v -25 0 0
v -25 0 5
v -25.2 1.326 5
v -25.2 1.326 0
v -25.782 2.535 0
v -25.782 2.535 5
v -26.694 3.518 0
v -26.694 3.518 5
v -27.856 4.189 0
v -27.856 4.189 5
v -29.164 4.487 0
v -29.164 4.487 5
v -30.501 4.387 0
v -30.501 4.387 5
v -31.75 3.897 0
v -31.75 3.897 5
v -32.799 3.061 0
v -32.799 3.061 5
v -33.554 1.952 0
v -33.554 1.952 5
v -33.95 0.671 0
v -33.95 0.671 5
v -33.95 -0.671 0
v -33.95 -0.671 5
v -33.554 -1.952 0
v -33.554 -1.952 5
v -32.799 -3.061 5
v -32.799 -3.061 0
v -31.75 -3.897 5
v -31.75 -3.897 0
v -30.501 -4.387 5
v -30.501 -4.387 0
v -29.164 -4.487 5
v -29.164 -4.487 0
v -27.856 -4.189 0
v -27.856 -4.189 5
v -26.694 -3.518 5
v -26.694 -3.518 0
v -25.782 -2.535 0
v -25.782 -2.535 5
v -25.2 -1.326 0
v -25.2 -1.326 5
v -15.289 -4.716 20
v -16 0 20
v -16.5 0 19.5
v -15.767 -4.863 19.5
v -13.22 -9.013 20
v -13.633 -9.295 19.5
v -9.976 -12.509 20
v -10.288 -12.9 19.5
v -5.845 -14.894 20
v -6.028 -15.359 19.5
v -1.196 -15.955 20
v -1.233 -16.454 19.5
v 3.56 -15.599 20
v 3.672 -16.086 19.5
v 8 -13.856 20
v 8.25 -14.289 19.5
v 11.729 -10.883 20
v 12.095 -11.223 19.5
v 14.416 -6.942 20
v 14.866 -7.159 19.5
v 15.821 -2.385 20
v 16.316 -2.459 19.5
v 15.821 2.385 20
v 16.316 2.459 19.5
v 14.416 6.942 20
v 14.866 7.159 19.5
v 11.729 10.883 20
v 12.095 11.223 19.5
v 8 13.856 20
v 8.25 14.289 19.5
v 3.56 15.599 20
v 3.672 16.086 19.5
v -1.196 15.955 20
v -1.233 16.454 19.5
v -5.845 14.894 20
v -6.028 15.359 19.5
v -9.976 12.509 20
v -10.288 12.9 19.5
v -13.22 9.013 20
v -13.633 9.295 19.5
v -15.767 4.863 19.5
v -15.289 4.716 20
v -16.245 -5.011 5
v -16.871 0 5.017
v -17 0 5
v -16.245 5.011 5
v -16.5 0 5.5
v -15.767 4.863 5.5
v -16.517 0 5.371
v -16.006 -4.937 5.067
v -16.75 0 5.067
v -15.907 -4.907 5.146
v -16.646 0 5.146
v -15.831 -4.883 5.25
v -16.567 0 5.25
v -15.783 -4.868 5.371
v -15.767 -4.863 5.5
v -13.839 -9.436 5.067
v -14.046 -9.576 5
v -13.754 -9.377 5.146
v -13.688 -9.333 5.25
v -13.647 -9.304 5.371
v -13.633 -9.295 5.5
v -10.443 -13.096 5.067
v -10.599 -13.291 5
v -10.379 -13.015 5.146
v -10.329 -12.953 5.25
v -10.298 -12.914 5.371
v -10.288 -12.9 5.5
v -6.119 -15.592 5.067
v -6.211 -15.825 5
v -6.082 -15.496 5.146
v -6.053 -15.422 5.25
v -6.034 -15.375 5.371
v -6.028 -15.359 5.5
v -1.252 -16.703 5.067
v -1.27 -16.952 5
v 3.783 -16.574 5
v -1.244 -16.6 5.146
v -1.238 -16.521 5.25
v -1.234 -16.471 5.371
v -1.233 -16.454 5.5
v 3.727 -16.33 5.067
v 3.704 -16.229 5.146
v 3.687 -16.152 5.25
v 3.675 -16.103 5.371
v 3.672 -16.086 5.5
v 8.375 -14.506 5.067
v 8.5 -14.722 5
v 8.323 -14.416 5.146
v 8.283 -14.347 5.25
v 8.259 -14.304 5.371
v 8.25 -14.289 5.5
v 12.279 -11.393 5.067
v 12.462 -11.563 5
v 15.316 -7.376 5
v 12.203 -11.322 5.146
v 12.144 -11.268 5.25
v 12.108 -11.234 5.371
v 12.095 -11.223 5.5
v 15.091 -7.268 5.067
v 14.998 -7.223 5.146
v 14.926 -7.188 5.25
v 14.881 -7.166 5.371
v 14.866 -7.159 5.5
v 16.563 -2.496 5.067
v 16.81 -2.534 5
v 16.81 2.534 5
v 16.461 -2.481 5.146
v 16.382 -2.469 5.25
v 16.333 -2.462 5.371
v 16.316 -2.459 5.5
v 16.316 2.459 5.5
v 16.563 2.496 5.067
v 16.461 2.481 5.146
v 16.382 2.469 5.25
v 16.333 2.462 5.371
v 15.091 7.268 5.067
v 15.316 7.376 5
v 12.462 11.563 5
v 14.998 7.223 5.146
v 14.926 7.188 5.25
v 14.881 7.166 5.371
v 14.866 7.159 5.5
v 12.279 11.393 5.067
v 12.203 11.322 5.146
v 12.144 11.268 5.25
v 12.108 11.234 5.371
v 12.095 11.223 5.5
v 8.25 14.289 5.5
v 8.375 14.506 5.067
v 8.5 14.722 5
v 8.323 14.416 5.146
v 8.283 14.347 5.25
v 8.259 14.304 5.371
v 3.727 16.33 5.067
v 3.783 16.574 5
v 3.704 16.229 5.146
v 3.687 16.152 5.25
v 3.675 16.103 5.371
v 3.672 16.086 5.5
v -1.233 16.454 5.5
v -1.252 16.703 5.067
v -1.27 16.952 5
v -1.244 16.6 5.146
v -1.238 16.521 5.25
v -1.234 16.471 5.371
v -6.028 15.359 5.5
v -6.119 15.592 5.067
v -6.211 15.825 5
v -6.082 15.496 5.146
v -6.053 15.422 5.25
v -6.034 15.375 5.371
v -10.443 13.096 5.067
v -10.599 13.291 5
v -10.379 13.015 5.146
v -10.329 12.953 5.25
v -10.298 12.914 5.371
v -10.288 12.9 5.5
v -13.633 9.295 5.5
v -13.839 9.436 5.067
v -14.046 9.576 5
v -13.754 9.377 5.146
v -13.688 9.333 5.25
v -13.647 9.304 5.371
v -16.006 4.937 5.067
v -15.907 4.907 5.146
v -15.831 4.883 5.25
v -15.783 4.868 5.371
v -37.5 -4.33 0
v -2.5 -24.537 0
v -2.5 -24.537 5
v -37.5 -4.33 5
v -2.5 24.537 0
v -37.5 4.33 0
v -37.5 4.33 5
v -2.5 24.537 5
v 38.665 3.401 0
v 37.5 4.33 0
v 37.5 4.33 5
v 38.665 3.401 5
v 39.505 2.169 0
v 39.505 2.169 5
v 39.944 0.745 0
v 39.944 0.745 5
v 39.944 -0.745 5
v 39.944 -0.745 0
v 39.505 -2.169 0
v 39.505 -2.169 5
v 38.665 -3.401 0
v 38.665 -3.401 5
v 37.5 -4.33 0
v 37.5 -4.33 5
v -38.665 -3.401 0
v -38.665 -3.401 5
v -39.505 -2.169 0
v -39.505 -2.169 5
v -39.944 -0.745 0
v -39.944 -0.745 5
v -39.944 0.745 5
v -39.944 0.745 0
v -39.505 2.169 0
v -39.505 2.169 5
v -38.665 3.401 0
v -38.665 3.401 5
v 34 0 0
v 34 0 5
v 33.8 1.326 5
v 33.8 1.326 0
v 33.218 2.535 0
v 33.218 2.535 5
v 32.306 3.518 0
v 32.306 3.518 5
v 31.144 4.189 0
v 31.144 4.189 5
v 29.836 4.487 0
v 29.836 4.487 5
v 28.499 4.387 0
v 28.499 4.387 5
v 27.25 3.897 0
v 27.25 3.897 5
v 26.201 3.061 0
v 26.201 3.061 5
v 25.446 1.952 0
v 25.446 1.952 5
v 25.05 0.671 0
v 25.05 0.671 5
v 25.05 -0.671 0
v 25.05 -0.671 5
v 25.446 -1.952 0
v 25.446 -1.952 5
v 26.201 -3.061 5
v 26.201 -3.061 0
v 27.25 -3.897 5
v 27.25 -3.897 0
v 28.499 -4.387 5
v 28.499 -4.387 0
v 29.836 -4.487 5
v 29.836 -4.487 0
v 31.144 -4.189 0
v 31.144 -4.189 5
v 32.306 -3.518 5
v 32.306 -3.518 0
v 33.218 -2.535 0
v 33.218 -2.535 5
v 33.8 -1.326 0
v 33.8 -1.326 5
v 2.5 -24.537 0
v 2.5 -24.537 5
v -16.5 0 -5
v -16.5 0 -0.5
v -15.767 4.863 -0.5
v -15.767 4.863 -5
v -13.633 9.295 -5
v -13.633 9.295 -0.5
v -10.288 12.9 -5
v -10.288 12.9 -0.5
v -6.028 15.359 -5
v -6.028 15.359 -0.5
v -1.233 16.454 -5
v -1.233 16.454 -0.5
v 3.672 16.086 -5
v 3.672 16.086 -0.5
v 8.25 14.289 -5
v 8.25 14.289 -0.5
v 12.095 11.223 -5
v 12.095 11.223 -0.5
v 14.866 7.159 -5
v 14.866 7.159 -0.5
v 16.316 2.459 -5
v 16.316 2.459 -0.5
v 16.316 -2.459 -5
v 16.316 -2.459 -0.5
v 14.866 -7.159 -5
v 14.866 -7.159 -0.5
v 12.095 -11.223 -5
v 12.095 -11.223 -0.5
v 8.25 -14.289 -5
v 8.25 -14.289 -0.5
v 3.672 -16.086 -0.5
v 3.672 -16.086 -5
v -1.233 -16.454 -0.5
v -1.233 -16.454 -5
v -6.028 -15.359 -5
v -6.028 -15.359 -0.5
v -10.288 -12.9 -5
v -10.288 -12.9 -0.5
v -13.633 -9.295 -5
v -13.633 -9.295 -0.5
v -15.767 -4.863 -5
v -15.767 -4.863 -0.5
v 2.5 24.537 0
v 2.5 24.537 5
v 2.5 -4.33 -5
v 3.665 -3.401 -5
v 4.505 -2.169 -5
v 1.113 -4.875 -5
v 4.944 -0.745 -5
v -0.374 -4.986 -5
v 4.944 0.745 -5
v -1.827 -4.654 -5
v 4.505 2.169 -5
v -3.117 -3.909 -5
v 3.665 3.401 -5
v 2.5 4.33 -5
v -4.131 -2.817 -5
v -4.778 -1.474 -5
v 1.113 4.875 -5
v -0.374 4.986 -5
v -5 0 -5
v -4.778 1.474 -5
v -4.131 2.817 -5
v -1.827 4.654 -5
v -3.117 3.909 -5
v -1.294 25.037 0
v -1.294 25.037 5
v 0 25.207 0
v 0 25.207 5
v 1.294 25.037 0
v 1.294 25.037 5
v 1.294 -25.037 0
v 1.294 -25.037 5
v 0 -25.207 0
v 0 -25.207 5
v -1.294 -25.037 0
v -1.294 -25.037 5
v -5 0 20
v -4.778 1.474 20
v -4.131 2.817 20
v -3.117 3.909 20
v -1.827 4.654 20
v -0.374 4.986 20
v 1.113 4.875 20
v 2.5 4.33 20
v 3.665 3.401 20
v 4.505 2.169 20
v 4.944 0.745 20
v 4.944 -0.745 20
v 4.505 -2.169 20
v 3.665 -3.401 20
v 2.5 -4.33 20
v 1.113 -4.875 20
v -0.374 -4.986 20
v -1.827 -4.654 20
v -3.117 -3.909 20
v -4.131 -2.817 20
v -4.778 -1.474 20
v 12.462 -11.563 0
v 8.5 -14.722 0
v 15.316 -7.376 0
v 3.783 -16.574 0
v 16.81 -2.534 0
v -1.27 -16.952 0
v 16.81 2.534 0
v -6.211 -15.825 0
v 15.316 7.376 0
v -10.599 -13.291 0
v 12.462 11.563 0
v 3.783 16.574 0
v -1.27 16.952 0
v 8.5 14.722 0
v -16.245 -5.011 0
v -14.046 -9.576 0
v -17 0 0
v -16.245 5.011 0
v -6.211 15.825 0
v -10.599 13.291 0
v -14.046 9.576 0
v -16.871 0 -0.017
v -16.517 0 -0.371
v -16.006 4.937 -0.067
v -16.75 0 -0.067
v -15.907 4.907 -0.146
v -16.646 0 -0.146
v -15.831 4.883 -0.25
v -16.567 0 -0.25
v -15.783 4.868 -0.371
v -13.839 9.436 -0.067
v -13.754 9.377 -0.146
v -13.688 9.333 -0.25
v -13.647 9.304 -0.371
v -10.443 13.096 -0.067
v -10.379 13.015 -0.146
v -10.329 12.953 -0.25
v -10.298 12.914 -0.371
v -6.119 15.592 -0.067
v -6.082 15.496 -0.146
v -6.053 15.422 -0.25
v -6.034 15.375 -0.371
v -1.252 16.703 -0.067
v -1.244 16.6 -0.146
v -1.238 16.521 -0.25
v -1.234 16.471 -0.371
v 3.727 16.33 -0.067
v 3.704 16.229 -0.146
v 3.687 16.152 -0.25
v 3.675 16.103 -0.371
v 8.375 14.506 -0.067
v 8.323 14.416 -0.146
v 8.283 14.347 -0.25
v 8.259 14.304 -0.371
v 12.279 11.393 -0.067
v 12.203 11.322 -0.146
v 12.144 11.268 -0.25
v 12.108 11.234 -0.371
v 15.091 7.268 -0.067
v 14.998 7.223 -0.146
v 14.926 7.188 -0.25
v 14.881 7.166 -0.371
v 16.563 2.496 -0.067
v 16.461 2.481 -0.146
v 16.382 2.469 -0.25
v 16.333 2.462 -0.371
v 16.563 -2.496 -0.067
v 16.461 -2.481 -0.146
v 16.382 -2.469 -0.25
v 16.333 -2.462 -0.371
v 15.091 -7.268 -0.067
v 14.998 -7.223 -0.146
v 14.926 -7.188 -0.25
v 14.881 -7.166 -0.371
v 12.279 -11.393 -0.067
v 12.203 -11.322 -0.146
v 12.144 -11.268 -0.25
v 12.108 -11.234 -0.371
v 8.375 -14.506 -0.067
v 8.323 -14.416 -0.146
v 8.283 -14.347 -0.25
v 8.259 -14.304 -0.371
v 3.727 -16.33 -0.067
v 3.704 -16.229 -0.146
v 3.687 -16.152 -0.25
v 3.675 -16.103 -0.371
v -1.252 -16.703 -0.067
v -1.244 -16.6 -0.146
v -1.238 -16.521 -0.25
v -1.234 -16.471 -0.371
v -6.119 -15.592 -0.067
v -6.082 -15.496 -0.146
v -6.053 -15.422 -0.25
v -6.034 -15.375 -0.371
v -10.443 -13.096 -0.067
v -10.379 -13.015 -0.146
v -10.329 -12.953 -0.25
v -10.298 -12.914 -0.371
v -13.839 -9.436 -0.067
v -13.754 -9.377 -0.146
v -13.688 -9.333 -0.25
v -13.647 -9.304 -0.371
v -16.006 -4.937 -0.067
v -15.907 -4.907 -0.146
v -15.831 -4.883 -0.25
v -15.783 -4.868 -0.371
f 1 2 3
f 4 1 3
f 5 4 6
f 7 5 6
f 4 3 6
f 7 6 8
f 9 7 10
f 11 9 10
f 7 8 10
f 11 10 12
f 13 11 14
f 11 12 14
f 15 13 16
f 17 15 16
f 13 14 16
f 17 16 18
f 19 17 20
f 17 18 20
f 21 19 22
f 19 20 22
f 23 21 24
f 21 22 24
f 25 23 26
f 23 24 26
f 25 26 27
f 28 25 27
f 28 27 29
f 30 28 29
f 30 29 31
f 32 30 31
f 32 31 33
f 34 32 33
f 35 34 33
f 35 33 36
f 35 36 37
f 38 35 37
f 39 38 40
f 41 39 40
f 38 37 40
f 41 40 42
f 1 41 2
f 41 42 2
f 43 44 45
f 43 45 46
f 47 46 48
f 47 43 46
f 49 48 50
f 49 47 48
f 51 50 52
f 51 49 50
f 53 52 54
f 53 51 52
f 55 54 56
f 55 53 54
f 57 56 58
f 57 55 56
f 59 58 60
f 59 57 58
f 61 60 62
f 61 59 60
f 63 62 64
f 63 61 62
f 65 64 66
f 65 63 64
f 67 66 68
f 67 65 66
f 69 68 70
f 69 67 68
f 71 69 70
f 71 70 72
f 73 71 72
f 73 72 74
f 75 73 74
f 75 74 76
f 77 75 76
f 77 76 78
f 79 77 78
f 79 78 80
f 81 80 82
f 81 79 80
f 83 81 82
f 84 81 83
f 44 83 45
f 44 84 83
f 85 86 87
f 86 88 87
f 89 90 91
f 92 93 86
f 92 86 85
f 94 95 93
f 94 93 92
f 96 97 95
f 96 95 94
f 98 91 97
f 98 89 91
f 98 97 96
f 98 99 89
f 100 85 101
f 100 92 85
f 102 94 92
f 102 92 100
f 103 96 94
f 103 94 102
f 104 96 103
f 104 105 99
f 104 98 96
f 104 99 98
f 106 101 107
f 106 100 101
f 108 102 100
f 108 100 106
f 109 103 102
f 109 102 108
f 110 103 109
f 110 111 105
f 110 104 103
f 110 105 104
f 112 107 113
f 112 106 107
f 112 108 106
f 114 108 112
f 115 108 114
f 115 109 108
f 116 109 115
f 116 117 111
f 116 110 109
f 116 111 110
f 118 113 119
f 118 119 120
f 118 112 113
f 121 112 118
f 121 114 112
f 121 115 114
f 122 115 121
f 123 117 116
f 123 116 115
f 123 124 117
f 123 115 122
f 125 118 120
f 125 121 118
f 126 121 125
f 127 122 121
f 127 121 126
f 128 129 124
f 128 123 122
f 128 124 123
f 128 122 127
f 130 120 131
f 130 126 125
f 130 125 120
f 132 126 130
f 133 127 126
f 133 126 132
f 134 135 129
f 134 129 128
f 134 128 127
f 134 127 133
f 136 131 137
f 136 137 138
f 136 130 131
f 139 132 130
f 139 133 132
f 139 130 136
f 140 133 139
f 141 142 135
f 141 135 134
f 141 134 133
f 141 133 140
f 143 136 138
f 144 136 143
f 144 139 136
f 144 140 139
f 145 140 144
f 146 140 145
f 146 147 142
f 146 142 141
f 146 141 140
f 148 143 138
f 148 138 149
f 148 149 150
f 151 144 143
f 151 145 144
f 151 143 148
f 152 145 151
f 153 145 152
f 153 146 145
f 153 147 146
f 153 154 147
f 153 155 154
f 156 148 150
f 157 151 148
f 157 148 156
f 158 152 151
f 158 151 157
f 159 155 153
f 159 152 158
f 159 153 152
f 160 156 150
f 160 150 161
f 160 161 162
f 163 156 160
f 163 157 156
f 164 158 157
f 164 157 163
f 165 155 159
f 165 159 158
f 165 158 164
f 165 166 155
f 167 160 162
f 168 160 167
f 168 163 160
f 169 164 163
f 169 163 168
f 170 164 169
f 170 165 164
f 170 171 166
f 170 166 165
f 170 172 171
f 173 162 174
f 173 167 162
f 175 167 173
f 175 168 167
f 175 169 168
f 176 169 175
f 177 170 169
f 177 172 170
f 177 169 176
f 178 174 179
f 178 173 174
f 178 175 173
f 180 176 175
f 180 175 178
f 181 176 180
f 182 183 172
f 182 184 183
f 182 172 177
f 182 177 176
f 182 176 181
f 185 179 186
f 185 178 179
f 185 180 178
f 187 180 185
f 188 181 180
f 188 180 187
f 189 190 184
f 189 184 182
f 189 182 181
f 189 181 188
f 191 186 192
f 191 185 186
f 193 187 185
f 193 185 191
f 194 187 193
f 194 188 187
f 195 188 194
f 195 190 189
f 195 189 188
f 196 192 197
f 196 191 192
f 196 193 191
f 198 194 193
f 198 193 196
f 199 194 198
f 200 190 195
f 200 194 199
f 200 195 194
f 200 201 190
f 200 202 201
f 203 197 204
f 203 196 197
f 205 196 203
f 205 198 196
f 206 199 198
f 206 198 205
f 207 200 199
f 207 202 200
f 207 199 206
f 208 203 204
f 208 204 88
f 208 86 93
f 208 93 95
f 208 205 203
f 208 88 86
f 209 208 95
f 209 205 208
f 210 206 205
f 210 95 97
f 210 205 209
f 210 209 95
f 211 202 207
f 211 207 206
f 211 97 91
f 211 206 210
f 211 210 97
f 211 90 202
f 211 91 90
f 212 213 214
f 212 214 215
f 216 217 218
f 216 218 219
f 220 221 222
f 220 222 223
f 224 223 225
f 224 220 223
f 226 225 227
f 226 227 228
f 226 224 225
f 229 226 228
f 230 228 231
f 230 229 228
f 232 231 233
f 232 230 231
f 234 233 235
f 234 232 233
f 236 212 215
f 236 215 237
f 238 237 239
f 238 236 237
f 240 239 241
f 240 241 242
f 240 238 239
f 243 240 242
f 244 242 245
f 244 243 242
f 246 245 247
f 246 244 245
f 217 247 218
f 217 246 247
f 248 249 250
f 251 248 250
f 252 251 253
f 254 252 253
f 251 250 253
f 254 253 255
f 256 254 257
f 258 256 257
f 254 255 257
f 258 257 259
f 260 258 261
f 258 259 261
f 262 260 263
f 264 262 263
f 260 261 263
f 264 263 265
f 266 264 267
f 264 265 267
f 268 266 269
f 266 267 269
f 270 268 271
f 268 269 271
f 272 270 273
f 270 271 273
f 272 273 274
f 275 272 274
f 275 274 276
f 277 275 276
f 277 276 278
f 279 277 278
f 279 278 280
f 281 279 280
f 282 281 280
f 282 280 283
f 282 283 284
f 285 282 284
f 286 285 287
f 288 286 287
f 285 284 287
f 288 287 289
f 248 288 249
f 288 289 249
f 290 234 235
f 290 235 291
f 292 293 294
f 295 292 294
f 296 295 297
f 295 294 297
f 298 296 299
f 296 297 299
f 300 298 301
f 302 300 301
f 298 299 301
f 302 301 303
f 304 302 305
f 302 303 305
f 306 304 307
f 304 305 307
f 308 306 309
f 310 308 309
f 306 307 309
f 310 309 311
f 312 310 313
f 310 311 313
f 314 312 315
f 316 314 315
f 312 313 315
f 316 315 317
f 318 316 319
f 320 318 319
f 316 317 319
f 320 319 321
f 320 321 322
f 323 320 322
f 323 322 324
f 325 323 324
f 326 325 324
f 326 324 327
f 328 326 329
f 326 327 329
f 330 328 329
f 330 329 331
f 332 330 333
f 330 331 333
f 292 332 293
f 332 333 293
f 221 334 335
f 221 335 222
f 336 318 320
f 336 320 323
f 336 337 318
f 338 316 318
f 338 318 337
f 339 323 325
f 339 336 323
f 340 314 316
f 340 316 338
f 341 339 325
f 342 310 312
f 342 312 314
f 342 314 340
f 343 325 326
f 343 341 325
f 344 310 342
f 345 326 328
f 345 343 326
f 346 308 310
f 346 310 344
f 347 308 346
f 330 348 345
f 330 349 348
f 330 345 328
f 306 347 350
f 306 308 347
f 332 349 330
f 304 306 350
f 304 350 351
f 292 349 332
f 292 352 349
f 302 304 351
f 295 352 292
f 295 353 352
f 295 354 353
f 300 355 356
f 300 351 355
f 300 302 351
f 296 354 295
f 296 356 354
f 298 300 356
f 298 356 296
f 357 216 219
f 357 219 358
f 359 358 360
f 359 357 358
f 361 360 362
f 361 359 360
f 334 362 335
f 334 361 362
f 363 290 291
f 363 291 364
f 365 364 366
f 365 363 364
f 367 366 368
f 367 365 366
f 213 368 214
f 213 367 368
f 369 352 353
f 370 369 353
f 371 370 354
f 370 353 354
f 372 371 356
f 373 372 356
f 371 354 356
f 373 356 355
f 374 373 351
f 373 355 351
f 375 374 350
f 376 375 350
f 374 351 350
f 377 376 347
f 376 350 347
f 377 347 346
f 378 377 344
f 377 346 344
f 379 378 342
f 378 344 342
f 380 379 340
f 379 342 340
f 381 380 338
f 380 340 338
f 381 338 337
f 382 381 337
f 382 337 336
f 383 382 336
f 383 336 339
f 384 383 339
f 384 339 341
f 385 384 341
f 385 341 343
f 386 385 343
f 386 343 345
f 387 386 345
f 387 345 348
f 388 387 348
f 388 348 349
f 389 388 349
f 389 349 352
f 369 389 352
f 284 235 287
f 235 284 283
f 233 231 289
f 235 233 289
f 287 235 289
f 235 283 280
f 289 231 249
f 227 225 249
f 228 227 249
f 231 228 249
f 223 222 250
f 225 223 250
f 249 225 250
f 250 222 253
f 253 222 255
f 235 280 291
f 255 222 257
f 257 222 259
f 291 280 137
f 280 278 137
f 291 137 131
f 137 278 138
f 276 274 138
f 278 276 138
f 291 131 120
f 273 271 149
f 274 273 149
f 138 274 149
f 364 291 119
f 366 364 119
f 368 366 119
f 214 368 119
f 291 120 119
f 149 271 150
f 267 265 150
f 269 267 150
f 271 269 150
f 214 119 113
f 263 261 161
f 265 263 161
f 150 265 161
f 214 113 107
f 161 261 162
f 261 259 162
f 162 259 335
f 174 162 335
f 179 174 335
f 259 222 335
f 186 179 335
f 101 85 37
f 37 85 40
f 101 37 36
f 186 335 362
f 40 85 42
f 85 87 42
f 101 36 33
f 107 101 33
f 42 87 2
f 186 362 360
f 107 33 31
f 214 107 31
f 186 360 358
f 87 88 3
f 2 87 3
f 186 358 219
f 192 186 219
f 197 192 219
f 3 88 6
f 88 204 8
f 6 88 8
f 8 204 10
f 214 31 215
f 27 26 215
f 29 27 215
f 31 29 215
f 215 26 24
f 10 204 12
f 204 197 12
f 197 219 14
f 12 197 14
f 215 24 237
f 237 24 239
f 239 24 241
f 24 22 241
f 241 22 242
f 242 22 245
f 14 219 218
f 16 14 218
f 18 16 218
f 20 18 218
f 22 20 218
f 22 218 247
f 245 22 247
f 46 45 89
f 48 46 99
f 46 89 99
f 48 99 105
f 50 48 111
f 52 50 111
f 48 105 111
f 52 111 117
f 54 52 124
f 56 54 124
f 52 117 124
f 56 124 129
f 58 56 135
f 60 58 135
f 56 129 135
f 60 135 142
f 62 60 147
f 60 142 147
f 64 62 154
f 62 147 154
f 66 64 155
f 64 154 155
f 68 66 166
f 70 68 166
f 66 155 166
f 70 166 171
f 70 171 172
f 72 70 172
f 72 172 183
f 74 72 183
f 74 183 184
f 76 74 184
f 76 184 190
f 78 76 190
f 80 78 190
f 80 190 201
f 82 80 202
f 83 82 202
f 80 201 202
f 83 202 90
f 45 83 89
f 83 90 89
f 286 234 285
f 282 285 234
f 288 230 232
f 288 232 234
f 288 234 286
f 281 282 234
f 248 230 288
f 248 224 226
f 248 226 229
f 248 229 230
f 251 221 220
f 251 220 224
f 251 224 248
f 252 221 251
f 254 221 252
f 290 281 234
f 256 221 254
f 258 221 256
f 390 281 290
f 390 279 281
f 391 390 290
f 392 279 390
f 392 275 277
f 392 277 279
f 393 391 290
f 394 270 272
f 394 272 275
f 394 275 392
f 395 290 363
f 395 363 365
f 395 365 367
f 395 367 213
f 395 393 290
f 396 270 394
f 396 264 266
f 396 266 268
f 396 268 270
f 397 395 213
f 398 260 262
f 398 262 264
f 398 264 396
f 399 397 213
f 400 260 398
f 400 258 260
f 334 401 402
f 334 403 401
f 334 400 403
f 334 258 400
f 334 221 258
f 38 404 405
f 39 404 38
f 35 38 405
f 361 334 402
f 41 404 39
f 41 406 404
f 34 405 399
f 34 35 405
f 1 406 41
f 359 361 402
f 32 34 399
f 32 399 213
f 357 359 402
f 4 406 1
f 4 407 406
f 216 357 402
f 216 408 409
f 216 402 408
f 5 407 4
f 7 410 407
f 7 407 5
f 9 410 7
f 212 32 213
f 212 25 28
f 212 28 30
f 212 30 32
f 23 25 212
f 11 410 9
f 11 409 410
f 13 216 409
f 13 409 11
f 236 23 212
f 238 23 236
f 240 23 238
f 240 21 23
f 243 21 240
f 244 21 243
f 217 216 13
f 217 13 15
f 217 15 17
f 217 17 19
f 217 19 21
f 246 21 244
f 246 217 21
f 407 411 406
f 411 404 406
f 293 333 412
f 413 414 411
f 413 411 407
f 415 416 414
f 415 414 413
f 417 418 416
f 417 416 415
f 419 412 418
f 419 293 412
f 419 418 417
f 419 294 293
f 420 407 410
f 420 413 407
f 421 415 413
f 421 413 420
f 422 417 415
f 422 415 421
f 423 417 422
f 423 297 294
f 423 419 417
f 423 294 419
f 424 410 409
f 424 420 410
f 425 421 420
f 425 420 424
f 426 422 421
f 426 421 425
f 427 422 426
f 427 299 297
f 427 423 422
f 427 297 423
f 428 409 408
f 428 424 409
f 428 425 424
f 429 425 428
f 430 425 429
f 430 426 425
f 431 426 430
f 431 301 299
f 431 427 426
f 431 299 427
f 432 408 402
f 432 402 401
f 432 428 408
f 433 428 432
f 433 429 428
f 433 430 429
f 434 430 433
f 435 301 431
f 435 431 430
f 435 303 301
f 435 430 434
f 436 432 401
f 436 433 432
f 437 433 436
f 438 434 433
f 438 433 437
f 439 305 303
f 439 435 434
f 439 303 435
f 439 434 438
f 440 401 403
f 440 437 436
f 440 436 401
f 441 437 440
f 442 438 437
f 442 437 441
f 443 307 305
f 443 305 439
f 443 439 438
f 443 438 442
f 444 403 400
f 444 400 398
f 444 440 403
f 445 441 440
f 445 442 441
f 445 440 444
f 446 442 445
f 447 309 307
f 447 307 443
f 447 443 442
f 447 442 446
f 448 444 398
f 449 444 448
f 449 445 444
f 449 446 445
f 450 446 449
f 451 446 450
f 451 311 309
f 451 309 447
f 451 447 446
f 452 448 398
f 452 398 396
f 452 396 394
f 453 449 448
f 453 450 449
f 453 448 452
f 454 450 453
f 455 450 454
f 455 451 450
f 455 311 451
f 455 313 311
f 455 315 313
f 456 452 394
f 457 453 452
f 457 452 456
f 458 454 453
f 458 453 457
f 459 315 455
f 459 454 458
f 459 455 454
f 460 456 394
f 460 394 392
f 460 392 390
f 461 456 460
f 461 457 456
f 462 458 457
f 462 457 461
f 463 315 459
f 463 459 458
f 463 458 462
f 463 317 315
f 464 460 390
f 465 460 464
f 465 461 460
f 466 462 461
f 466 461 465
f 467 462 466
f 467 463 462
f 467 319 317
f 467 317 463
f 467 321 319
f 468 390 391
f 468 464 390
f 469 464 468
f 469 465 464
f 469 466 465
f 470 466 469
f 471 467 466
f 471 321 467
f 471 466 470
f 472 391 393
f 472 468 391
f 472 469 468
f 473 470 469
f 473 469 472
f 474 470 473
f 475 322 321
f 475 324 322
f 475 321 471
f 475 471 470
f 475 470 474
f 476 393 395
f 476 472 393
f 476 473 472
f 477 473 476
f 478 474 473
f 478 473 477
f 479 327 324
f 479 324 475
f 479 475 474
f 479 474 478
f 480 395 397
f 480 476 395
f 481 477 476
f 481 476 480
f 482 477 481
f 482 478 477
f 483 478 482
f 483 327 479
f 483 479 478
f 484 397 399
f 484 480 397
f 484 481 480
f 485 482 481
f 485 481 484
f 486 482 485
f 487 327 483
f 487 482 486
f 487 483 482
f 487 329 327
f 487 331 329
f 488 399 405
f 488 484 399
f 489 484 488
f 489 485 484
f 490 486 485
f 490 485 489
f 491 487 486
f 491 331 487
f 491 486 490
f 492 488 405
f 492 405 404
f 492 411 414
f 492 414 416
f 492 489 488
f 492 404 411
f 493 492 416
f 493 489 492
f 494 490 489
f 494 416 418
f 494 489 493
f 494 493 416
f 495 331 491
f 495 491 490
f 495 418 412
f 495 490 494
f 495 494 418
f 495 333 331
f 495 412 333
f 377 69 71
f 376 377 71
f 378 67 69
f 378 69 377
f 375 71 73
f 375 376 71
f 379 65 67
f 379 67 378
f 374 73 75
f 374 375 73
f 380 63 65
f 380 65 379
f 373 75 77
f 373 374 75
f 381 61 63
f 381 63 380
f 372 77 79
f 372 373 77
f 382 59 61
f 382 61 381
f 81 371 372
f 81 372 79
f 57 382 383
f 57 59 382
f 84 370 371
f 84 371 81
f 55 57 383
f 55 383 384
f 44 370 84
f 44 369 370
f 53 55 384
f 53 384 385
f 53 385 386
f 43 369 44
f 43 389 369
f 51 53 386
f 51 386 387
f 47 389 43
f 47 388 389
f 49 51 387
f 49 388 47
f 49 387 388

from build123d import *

# Parameters (mm, degrees)
BOSS_EXTRU_1_DEPTH      = 5
ESQUISSE3_R             = 16.5
BOSS_EXTRU_2_DEPTH      = 15
ESQUISSE4_R             = 16.5
BOSS_EXTRU_3_DEPTH      = 5
ESQUISSE5_R             = 5
ENL_V_MAT_EXTRU_1_DEPTH = 26
ESQUISSE6_R             = 4.5
ENL_V_MAT_EXTRU_2_DEPTH = 5
CONG_1_R                = 0.5
CHANFREIN1_SIZE         = 0.5


with BuildPart() as part:
    # Esquisse2 → Boss.-Extru.1 (new body)
    with BuildSketch(Plane.XY):
        with BuildLine():
            Line((-37.5, 4.330127019), (-2.5, 24.537386441))
            ThreePointArc((-2.5, 24.537386441), (0, 25.207259422), (2.5, 24.537386441))
            Line((2.5, 24.537386441), (37.5, 4.330127019))
            ThreePointArc((37.5, 4.330127019), (40, 0), (37.5, -4.330127019))
            Line((37.5, -4.330127019), (2.5, -24.537386441))
            ThreePointArc((2.5, -24.537386441), (0, -25.207259422), (-2.5, -24.537386441))
            Line((-2.5, -24.537386441), (-37.5, -4.330127019))
            ThreePointArc((-37.5, -4.330127019), (-40, 0), (-37.5, 4.330127019))
        make_face()
    extrude(amount=BOSS_EXTRU_1_DEPTH)

    # Esquisse3 → Boss.-Extru.2 (add)
    with BuildSketch(Plane.XY.offset(5)):
        with Locations(Location((0, 0, 0), (0, 0, 180))):  # turned: the seam where the file's is
            Circle(ESQUISSE3_R)
    extrude(amount=BOSS_EXTRU_2_DEPTH)

    # Esquisse4 → Boss.-Extru.3 (add)
    with BuildSketch(Plane(origin=(0, 0, 0), x_dir=(-1, 0, 0), z_dir=(0, 0, -1))):
        Circle(ESQUISSE4_R)
    extrude(amount=BOSS_EXTRU_3_DEPTH)

    # Esquisse5 → Enlèv. mat.-Extru.1 (cut, through all)
    with BuildSketch(Plane(origin=(0, 0, -5), x_dir=(-1, 0, 0), z_dir=(0, 0, -1))):
        Circle(ESQUISSE5_R)
    extrude(amount=-ENL_V_MAT_EXTRU_1_DEPTH, mode=Mode.SUBTRACT)

    # Esquisse6 → Enlèv. mat.-Extru.2 (cut)
    with BuildSketch(Plane.XY.offset(5)):
        with Locations((29.5, 0)):
            Circle(ESQUISSE6_R)
        with Locations((-29.5, 0)):
            Circle(ESQUISSE6_R)
    extrude(amount=-ENL_V_MAT_EXTRU_2_DEPTH, mode=Mode.SUBTRACT)

    # Congé1
    cong_1_edges = [part.edges().sort_by_distance(p)[0] for p in [
        (16.5, 0, 5),
        (16.5, 0, 0),
    ]]
    fillet(cong_1_edges, radius=CONG_1_R)

    # Chanfrein1
    chanfrein1_edges = [part.edges().sort_by_distance(p)[0] for p in [
        (16.5, 0, 20),
    ]]
    chamfer(chanfrein1_edges, length=CHANFREIN1_SIZE)


solid = part.part
